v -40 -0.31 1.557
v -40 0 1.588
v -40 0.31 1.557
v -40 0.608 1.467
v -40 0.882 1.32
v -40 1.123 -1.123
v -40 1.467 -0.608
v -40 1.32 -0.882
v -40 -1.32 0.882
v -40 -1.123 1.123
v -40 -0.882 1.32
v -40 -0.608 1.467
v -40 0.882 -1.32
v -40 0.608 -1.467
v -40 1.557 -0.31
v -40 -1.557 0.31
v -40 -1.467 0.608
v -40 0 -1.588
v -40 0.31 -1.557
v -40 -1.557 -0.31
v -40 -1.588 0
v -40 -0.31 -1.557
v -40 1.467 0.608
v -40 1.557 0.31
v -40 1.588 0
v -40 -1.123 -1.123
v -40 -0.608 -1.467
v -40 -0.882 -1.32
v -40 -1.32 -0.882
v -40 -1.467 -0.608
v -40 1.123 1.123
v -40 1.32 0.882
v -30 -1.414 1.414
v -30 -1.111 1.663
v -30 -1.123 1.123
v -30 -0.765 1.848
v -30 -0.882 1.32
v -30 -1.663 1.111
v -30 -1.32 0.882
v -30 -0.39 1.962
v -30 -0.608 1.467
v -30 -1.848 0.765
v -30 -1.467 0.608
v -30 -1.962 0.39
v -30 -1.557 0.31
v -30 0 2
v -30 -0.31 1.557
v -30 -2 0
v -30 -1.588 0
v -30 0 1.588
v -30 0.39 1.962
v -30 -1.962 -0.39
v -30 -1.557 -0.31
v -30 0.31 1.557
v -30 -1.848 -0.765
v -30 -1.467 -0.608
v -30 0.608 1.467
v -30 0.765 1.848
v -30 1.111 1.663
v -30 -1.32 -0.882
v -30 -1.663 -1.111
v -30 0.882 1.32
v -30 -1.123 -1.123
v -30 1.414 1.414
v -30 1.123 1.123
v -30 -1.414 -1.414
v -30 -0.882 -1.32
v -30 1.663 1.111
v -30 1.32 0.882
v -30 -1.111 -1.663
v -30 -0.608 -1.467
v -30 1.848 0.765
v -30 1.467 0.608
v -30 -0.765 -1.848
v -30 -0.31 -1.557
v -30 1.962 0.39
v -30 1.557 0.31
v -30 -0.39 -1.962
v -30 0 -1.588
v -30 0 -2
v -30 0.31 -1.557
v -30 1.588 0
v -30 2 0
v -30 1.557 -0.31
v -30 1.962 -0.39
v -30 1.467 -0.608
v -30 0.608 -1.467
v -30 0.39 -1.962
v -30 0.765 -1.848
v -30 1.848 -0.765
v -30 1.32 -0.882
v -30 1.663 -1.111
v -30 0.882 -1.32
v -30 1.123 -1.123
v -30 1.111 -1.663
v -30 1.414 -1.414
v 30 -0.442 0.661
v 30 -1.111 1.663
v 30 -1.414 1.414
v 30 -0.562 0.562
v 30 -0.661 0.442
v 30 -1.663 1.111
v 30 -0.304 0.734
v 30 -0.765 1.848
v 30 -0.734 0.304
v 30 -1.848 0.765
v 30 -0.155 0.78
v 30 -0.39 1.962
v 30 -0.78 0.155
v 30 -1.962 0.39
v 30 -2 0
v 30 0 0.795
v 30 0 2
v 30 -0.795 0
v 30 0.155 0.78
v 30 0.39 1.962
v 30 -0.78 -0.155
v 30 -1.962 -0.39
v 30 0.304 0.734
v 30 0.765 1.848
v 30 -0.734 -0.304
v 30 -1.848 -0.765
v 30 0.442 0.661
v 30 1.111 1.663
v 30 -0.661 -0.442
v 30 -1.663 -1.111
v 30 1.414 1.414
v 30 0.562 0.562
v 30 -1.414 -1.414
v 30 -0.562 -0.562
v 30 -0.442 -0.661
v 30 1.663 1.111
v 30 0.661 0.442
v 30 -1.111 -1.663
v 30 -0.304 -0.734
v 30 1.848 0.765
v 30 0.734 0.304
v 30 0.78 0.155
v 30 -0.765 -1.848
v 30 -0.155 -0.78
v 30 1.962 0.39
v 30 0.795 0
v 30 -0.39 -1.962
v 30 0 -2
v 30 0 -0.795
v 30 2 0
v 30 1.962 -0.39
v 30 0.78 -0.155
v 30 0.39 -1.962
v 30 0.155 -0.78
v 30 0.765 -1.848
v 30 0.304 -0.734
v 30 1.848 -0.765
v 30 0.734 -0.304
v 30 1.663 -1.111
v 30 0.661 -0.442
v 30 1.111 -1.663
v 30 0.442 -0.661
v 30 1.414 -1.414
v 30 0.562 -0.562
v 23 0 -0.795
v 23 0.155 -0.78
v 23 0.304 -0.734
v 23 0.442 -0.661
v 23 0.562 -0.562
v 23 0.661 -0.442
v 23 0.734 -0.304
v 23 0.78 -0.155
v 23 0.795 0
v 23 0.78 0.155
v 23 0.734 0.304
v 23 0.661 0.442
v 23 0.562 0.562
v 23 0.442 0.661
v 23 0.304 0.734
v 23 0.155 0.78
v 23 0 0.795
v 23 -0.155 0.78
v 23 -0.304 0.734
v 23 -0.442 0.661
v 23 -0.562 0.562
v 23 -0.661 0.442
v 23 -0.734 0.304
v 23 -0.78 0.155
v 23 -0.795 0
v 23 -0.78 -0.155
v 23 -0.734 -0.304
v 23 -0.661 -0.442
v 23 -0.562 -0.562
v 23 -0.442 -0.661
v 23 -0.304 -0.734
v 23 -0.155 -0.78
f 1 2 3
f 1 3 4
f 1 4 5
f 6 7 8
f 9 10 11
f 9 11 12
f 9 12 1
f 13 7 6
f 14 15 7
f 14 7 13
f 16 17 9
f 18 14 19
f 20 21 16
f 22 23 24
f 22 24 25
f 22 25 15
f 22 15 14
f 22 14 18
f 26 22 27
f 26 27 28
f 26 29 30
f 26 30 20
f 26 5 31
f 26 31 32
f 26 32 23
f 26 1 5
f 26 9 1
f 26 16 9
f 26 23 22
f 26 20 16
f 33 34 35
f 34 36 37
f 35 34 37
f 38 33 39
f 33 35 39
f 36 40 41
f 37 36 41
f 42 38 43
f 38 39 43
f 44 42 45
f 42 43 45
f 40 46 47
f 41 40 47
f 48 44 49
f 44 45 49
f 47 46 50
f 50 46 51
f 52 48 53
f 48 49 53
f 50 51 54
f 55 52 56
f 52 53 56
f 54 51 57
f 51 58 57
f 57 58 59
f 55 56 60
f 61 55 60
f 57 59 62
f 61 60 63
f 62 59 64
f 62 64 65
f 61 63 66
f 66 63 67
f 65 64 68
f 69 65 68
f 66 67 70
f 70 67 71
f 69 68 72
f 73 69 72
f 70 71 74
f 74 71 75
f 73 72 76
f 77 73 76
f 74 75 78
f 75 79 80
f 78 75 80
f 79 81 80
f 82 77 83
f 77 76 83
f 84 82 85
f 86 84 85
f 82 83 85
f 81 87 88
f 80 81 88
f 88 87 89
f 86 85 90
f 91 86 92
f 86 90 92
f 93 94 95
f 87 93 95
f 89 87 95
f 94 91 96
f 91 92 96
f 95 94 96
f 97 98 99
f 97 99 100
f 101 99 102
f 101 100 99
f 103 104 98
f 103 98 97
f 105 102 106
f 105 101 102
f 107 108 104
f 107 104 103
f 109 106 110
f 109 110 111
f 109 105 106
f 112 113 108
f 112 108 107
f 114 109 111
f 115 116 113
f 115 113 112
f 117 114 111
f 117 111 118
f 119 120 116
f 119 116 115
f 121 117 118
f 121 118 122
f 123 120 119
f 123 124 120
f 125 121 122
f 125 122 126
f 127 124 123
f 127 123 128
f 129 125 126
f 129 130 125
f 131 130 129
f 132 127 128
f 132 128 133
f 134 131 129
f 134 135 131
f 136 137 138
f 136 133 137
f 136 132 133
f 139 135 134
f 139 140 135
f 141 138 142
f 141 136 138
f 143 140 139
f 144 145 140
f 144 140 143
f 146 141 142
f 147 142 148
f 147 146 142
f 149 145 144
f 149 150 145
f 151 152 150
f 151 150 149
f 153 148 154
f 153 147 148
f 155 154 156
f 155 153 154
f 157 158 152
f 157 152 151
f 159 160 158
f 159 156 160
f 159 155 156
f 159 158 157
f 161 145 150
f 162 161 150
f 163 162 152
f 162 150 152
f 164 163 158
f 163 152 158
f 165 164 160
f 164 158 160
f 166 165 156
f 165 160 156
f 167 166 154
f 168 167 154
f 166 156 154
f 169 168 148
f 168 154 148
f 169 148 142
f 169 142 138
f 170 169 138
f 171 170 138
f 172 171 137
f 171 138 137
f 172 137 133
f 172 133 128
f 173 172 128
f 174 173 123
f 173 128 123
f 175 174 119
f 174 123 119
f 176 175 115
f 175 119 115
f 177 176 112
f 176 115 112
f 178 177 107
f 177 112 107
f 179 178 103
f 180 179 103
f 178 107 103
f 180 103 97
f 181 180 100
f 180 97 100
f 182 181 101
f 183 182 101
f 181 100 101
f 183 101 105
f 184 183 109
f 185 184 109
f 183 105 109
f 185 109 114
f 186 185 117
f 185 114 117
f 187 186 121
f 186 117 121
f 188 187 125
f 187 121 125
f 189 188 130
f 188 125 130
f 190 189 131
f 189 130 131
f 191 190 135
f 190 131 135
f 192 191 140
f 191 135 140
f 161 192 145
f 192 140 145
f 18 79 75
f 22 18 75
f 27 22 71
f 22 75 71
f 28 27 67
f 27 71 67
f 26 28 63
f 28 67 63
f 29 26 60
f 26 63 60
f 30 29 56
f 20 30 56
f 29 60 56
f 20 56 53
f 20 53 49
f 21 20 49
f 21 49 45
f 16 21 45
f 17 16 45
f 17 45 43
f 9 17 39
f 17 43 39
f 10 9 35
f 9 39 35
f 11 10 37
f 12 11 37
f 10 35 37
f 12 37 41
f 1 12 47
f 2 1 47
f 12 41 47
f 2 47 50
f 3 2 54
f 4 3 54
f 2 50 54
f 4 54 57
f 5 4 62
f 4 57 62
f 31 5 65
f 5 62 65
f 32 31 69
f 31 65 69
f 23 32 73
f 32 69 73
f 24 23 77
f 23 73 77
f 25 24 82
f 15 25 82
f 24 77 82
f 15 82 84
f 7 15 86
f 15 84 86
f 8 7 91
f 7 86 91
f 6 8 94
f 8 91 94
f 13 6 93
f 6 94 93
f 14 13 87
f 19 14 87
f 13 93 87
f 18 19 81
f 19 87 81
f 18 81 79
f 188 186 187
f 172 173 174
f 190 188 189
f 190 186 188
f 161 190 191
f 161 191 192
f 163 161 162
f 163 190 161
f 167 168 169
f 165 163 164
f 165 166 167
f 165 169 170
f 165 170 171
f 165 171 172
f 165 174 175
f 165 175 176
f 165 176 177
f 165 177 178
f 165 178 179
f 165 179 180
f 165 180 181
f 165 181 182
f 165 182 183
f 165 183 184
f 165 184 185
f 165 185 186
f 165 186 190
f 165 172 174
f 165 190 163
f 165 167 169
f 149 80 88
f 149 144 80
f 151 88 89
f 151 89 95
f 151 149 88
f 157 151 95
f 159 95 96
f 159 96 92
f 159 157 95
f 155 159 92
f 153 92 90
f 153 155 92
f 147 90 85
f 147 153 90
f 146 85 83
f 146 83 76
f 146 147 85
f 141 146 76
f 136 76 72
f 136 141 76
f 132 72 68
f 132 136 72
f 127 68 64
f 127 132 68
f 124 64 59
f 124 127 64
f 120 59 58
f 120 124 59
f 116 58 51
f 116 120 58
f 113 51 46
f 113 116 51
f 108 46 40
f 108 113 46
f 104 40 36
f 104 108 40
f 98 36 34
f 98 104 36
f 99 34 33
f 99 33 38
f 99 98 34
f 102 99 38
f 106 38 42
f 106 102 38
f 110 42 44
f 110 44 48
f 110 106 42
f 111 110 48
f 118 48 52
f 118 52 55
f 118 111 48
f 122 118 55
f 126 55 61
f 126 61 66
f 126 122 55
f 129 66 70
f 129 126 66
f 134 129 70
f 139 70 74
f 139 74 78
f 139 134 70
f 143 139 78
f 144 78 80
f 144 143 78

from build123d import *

# Parameters (mm, degrees)
SKETCH1_R           = 2
BOSS_EXTRUDE1_DEPTH = 30
SKETCH2_R           = 0.795
CUT_EXTRUDE1_DEPTH  = 7
SKETCH3_R           = 1.5875
BOSS_EXTRUDE2_DEPTH = 10


with BuildPart() as part:
    # Sketch1 → Boss-Extrude1 (new, symmetric)
    with BuildSketch(Plane(origin=(0, 0, 0), x_dir=(0, 0, -1), z_dir=(1, 0, 0))):
        Circle(SKETCH1_R)
    extrude(amount=BOSS_EXTRUDE1_DEPTH, both=True)

    # Sketch2 → Cut-Extrude1 (cut)
    with BuildSketch(Plane(origin=(30, 0, 0), x_dir=(0, 0, -1), z_dir=(1, 0, 0))):
        Circle(SKETCH2_R)
    extrude(amount=-CUT_EXTRUDE1_DEPTH, mode=Mode.SUBTRACT)

    # Sketch3 → Boss-Extrude2 (add)
    with BuildSketch(Plane.ZY.offset(30)):
        with Locations(Location((0, 0, 0), (0, 0, 180))):
            Circle(SKETCH3_R)
    extrude(amount=BOSS_EXTRUDE2_DEPTH)


solid = part.part
